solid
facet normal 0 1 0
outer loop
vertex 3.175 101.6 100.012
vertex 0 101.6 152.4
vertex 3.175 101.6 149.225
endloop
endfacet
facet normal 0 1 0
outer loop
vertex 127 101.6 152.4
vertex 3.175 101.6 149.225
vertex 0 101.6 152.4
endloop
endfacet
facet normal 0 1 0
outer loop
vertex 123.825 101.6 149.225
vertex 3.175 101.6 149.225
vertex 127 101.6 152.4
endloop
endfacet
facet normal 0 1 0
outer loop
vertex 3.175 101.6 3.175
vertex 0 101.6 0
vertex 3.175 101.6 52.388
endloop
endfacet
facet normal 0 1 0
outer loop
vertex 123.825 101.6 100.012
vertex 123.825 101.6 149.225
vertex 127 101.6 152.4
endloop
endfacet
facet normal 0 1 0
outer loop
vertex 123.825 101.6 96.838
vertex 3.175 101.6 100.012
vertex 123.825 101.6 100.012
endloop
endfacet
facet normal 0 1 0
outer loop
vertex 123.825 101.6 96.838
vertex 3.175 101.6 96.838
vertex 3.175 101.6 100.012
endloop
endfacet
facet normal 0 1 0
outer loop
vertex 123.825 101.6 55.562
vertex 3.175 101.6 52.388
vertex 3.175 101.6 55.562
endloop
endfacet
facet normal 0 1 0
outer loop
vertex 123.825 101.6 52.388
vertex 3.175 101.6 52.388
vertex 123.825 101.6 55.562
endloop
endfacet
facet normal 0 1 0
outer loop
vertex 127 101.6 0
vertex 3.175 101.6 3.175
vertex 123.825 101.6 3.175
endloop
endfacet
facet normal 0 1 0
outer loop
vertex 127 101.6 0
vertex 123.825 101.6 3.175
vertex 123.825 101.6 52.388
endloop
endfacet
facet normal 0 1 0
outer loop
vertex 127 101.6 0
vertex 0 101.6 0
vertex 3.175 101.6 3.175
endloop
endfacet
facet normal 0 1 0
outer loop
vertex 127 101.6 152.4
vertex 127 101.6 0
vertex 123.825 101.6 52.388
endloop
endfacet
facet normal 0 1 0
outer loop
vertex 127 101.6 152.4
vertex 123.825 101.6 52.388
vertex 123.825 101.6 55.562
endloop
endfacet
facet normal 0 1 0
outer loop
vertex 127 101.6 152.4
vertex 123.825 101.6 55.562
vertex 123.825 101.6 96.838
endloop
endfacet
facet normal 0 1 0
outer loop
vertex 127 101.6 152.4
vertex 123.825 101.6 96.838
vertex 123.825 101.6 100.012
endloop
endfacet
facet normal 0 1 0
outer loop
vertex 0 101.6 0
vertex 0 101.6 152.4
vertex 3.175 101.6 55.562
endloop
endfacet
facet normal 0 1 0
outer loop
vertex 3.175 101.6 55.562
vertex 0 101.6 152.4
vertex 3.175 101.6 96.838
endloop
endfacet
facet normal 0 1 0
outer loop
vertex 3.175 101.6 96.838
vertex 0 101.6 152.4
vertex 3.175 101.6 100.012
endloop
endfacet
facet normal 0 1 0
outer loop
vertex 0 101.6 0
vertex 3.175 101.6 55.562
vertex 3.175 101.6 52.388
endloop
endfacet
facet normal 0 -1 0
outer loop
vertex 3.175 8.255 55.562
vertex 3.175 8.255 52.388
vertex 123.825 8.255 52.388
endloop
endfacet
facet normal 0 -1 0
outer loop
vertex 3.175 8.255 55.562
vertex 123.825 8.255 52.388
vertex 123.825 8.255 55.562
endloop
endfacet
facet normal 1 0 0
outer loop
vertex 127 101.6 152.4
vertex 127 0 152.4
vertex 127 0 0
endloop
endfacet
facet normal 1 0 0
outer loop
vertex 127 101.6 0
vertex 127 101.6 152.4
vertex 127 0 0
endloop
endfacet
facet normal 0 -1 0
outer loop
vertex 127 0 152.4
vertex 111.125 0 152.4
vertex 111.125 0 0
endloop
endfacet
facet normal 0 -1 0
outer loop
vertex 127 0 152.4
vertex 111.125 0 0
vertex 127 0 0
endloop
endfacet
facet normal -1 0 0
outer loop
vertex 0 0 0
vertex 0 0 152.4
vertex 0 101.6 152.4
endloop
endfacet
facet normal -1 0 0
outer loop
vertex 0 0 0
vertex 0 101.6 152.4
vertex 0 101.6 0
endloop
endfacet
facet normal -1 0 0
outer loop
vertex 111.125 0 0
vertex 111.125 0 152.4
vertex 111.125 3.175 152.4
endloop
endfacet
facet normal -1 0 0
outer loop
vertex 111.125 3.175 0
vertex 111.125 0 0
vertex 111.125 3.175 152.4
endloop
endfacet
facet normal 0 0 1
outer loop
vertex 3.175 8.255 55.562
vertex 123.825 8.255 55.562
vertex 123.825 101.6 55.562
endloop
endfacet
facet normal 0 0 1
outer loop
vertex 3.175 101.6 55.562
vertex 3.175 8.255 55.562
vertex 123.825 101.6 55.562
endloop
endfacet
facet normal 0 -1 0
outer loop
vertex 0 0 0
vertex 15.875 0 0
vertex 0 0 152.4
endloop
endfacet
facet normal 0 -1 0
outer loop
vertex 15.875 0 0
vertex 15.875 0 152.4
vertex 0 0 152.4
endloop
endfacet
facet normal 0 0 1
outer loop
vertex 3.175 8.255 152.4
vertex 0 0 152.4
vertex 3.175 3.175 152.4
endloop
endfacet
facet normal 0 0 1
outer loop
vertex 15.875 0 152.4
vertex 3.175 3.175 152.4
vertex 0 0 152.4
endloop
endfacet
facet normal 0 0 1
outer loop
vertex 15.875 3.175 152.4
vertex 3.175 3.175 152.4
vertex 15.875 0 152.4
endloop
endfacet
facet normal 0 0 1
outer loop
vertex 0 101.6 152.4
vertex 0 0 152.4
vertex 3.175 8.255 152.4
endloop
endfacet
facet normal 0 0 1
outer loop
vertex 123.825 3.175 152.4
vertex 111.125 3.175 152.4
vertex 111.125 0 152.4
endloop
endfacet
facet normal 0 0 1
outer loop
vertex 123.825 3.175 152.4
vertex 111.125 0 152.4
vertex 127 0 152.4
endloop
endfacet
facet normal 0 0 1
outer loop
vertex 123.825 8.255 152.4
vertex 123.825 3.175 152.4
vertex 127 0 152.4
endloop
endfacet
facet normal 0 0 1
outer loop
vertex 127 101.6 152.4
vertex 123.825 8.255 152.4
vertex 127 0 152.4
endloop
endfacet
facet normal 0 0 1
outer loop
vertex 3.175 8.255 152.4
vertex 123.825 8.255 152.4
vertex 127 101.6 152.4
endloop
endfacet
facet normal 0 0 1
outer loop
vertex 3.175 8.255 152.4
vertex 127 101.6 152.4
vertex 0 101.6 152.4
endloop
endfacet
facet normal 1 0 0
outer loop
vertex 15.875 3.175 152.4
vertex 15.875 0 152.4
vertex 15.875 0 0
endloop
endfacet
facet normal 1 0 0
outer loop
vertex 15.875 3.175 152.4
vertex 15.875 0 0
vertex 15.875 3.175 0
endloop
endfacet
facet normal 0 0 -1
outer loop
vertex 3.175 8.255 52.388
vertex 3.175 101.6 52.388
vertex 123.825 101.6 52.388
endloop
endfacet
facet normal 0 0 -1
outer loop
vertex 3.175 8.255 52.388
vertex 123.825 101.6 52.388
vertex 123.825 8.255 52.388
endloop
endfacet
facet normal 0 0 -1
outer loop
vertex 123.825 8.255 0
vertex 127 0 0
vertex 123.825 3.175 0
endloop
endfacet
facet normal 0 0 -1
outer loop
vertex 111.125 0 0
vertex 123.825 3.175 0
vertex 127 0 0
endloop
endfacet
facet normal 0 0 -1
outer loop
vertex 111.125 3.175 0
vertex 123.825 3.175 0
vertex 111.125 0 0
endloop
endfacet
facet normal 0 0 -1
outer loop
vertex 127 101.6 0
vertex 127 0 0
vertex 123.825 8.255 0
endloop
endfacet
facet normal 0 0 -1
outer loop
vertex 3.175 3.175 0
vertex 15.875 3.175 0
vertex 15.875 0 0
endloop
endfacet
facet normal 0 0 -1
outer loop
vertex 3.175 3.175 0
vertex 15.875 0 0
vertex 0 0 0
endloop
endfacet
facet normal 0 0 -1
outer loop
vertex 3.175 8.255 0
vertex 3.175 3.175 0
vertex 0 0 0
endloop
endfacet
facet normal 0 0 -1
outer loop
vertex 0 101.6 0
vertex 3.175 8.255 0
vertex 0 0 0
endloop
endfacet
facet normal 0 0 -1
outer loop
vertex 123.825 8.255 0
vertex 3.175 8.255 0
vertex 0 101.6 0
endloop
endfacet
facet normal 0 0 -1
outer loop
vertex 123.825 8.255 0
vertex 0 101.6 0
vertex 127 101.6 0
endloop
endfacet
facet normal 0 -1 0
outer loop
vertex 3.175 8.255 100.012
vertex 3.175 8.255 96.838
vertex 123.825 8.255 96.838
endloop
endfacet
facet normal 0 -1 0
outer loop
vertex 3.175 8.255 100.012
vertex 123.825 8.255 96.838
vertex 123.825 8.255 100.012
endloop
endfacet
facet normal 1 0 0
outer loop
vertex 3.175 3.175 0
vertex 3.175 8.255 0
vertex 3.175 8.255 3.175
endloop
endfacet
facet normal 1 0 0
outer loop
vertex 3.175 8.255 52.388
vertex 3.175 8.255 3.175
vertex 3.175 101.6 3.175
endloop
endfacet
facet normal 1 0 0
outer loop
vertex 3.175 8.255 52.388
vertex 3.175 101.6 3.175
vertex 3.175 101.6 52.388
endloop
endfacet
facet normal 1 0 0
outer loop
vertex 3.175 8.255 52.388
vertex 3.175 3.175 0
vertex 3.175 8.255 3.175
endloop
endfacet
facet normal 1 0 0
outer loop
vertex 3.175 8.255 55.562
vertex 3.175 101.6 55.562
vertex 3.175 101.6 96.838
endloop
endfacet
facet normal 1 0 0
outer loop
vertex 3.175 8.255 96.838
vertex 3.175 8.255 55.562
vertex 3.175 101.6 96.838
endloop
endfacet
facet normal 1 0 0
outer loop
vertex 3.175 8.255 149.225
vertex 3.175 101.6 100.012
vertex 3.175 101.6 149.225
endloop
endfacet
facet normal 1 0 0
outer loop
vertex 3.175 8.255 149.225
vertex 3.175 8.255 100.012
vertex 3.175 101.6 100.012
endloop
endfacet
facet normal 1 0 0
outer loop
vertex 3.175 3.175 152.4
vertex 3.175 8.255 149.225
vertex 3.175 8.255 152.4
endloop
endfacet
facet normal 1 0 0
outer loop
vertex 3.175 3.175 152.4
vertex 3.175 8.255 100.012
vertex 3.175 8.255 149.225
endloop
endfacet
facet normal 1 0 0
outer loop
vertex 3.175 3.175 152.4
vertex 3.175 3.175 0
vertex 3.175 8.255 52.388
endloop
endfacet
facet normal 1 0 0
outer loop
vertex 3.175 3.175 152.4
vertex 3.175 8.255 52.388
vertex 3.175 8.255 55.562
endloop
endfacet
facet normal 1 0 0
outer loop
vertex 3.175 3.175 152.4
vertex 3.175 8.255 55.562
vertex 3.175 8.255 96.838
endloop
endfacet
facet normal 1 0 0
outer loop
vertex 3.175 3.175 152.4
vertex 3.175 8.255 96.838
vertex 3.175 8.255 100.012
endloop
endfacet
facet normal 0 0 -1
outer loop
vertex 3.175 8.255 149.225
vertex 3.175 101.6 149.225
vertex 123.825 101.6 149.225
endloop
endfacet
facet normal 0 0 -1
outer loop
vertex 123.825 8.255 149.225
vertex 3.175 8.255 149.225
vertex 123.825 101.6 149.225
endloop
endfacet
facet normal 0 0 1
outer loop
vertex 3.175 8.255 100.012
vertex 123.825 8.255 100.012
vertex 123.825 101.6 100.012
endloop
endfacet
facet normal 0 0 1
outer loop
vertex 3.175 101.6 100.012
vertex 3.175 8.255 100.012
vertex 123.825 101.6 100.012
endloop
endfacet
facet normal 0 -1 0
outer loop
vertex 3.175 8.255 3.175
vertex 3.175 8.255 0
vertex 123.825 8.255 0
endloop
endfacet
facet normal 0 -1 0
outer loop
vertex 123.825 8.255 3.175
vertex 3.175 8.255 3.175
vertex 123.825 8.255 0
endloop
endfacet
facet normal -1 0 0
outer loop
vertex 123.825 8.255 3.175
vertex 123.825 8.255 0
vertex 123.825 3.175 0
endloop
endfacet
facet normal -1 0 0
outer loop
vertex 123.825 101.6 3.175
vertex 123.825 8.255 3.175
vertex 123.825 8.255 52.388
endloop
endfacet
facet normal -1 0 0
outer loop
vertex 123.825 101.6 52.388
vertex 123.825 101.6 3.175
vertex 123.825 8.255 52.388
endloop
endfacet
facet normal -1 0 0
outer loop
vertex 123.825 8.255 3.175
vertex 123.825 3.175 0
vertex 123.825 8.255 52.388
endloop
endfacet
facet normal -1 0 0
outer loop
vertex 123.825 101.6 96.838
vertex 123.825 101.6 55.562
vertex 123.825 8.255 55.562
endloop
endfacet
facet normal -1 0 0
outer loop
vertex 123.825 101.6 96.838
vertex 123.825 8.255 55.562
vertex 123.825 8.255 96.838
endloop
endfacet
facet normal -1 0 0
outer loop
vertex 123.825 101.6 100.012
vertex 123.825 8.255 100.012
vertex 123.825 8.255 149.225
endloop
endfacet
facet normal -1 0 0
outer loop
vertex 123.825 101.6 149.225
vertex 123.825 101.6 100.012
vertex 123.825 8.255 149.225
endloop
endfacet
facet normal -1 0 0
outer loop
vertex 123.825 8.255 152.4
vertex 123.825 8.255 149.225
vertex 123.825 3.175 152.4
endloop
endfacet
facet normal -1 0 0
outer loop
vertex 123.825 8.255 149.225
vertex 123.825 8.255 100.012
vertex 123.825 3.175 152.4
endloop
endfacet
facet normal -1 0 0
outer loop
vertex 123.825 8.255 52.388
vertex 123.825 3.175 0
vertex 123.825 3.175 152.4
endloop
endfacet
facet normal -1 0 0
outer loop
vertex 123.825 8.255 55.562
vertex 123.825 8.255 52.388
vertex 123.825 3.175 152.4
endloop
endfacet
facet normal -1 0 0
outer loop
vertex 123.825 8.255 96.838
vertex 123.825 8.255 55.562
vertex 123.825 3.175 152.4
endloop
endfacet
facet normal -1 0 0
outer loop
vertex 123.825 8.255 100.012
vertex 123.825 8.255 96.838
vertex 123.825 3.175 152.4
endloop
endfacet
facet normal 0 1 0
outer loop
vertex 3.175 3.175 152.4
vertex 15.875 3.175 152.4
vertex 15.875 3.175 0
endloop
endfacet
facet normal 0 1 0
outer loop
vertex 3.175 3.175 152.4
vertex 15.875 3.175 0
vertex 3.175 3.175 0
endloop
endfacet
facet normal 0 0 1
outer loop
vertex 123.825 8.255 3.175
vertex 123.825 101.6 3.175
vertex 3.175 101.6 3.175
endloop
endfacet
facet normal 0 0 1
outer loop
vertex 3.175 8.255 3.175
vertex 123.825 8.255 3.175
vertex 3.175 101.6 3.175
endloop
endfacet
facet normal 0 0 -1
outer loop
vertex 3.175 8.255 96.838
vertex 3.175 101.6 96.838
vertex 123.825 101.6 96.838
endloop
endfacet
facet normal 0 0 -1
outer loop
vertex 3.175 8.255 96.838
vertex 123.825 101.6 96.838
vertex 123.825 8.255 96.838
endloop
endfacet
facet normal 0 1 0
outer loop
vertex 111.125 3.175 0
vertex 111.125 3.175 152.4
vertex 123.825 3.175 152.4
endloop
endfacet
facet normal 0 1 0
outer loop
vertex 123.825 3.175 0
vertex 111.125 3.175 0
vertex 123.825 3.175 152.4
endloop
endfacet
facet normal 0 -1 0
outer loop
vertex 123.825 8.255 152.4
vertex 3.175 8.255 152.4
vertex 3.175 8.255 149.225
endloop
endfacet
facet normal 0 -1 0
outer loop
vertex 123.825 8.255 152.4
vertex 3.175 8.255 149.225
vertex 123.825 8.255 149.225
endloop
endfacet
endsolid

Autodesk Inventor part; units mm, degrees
ref_plane "YZ Plane" through (0, 0, 0) normal (1, 0, 0) x (0, 1, 0)
ref_plane "XZ Plane" through (0, 0, 0) normal (0, 1, 0) x (-1, 0, 0)
ref_plane "XY Plane" through (0, 0, 0) normal (0, 0, 1) x (1, 0, 0)
sketch "Sketch1" plane through (0, 0, 0) normal (0, 1, 0) x (-1, 0, 0)
  line L0 (0, 0) -> (-3.175, 0)
  line L1 (-3.175, 0) -> (-3.175, 152.4)
  line L2 (-3.175, 152.4) -> (0, 152.4)
  line L3 (0, 152.4) -> (0, 0)
  dimension "d0" = 3.175
  dimension "d1" = 152.4
extrude "Extrusion1" add sketch "Sketch1" along normal blind 50.8
sketch "Sketch2" plane through (0, 0, 0) normal (0, -1, 0) x (1, 0, 0)
  line L0 (0, 0) -> (127, 0) construction
  line L1 (0, 0) -> (127, 0) construction
  line L2 (127, 0) -> (123.825, 0)
  line L3 (123.825, 0) -> (123.825, 152.4)
  line L4 (123.825, 152.4) -> (127, 152.4)
  line L5 (127, 152.4) -> (127, 0)
  dimension "d4" = 127
  dimension "d5" = 0
  dimension "d6" = 3.175
  dimension "d7" = 152.4
extrude "Extrusion2" add sketch "Sketch2" against normal blind 50.8
sketch "Sketch3" plane through (0, 0, 152.4) normal (0, 0, 1) x (1, 0, 0)
  line L0 (3.175, 0) -> (3.175, 50.8) projected
  line L1 (3.175, 0) -> (15.875, 0)
  line L2 (15.875, 0) -> (15.875, 3.175)
  line L3 (15.875, 3.175) -> (3.175, 3.175)
  line L4 (3.175, 3.175) -> (3.175, 0)
  point P0 (0, 0)
  point P1 (3.175, 3.175)
  dimension "d10" = 12.7
  dimension "d11" = 3.175
extrude "Extrusion3" add sketch "Sketch3" against normal blind 152.4
sketch "Sketch4" plane through (123.825, 0, 152.4) normal (0, 0, 1) x (1, 0, 0)
  line L0 (0, 0) -> (0, 50.8) projected
  line L1 (0, 0) -> (-12.7, 0)
  line L2 (-12.7, 0) -> (-12.7, 3.175)
  line L3 (-12.7, 3.175) -> (0, 3.175)
  line L4 (0, 3.175) -> (0, 0)
  point P0 (-123.825, 0)
  dimension "d14" = 12.7
  dimension "d15" = 3.175
extrude "Extrusion4" add sketch "Sketch4" against normal blind 152.4
sketch "Sketch5" plane through (0, 50.8, 152.4) normal (0, 0, 1) x (1, 0, 0)
  line L0 (15.875, -47.625) -> (3.175, -47.625) construction
  line L1 (3.175, -47.625) -> (3.175, -42.545) construction
  line L2 (3.175, -47.625) -> (3.175, 0) construction
  line L3 (127, 0) -> (123.825, 0) projected
  line L4 (3.175, -42.545) -> (123.825, -42.545)
  line L5 (123.825, -42.545) -> (123.825, 0)
  line L6 (123.825, 0) -> (3.175, 0)
  line L7 (3.175, 0) -> (3.175, -42.545)
  point P0 (0, -50.8)
  dimension "d18" = 5.08
extrude "Extrusion5" add sketch "Sketch5" against normal blind 3.175
sketch "Sketch6" plane through (127, 50.8, 0) normal (0, 0, -1) x (-1, 0, 0)
  line L0 (0, 0) -> (3.175, 0) projected
  line L1 (123.825, -42.545) -> (3.175, -42.545) projected
  line L2 (3.175, 0) -> (123.825, 0)
  line L3 (123.825, 0) -> (123.825, -42.545)
  line L4 (123.825, -42.545) -> (3.175, -42.545)
  line L5 (3.175, -42.545) -> (3.175, 0)
  point P0 (127, -50.8)
extrude "Extrusion6" add sketch "Sketch6" against normal blind 3.175
sketch "Sketch8" plane through (3.175, 3.175, 152.4) normal (1, 0, 0) x (0, 0, -1)
  line L0 (3.175, 47.625) -> (53.975, 47.625) construction
  line L1 (3.175, 47.625) -> (149.225, 47.625) construction
  line L2 (3.175, 47.625) -> (53.975, 47.625) construction
  line L3 (152.4, -3.175) -> (0, -3.175) construction
  line L4 (53.975, 47.625) -> (101.6, 47.625) construction
  line L5 (53.975, 0) -> (53.975, 5.08) construction
  line L6 (53.975, 47.625) -> (53.975, 5.08) construction
  line L7 (52.3875, 47.625) -> (55.5625, 47.625)
  line L8 (55.5625, 47.625) -> (55.5625, 5.08)
  line L9 (55.5625, 5.08) -> (52.3875, 5.08)
  line L10 (52.3875, 5.08) -> (52.3875, 47.625)
  line L11 (52.3875, 47.625) -> (55.5625, 5.08) construction
  line L12 (55.5625, 47.625) -> (52.3875, 5.08) construction
  point P0 (53.975, 26.3525)
  dimension "d26" = 50.8
  dimension "d27" = 0
  dimension "d28" = 47.625
  dimension "d30" = 5.08
  dimension "d32" = 3.175
extrude "Extrusion7" add sketch "Sketch8" along normal up to next
sketch "Sketch9" plane through (3.175, 3.175, 152.4) normal (1, 0, 0) x (0, 0, -1)
  line L0 (149.225, 5.08) -> (149.225, 47.625) construction
  line L1 (149.225, 47.625) -> (98.425, 47.625) construction
  line L2 (55.5625, 47.625) -> (149.225, 47.625) construction
  line L3 (98.425, 47.625) -> (146.05, 47.625) construction
  line L4 (98.425, 0) -> (98.425, 5.08) construction
  line L5 (98.425, 47.625) -> (98.425, 5.08) construction
  line L6 (96.8375, 47.625) -> (100.0125, 47.625)
  line L7 (100.0125, 47.625) -> (100.0125, 5.08)
  line L8 (100.0125, 5.08) -> (96.8375, 5.08)
  line L9 (96.8375, 5.08) -> (96.8375, 47.625)
  line L10 (96.8375, 47.625) -> (100.0125, 5.08) construction
  line L11 (100.0125, 47.625) -> (96.8375, 5.08) construction
  point P0 (152.4, -3.175)
  point P1 (98.425, 26.3525)
  dimension "d35" = 50.8
  dimension "d36" = 47.625
  dimension "d38" = 5.08
  dimension "d40" = 3.175
  dimension "d41" = 42.545
extrude "Extrusion8" add sketch "Sketch9" along normal up to next
sketch "Sketch10" plane through (0, 50.8, 0) normal (0, 1, 0) x (1, 0, 0)
  line L0 (3.175, -55.5625) -> (123.825, -55.5625) construction
  line L1 (123.825, -55.5625) -> (127, -55.5625) construction
  line L2 (127, 0) -> (127, -152.4) construction
  line L3 (3.175, -100.0125) -> (123.825, -100.0125) construction
  line L4 (3.175, -100.0125) -> (0, -100.0125) construction
  line L5 (127, 0) -> (0, 0) projected
  line L6 (0, 0) -> (127, 0)
  line L7 (127, 0) -> (127, -55.5625)
  line L8 (127, -55.5625) -> (0, -55.5625)
  line L9 (0, -55.5625) -> (0, 0)
  line L10 (3.175, -3.175) -> (123.825, -3.175)
  line L11 (123.825, -3.175) -> (123.825, -52.3875)
  line L12 (123.825, -52.3875) -> (3.175, -52.3875)
  line L13 (3.175, -52.3875) -> (3.175, -3.175)
  line L14 (0, -100.0125) -> (127, -100.0125)
  line L15 (127, -100.0125) -> (127, -52.3875)
  line L16 (127, -52.3875) -> (0, -52.3875)
  line L17 (0, -52.3875) -> (0, -100.0125)
  line L18 (3.175, -96.8375) -> (123.825, -96.8375)
  line L19 (123.825, -96.8375) -> (123.825, -55.5625)
  line L20 (123.825, -55.5625) -> (3.175, -55.5625)
  line L21 (3.175, -55.5625) -> (3.175, -96.8375)
  line L22 (0, 0) -> (0, -152.4) projected
  line L23 (0, -152.4) -> (127, -152.4)
  line L24 (127, -152.4) -> (127, -96.8375)
  line L25 (127, -96.8375) -> (0, -96.8375)
  line L26 (0, -96.8375) -> (0, -152.4)
  line L27 (123.825, -149.225) -> (3.175, -149.225)
  line L28 (3.175, -149.225) -> (3.175, -100.0125)
  line L29 (3.175, -100.0125) -> (123.825, -100.0125)
  line L30 (123.825, -100.0125) -> (123.825, -149.225)
  point P0 (3.175, -55.5625)
  dimension "d44" = 3.175
  dimension "d45" = 3.175
  dimension "d46" = 3.175
extrude "Extrusion9" add sketch "Sketch10" along normal blind 50.8 contours L7 L16 L11 L10 L13 L9 L5 | L7 L8 L9 L16 L12 | L15 L25 L19 L8 | L8 L21 L25 L17 | L15 L14 L17 L25 L18 | L24 L23 L22 L14 L28 L27 L30
properties part number "BeadCompartments_1"
